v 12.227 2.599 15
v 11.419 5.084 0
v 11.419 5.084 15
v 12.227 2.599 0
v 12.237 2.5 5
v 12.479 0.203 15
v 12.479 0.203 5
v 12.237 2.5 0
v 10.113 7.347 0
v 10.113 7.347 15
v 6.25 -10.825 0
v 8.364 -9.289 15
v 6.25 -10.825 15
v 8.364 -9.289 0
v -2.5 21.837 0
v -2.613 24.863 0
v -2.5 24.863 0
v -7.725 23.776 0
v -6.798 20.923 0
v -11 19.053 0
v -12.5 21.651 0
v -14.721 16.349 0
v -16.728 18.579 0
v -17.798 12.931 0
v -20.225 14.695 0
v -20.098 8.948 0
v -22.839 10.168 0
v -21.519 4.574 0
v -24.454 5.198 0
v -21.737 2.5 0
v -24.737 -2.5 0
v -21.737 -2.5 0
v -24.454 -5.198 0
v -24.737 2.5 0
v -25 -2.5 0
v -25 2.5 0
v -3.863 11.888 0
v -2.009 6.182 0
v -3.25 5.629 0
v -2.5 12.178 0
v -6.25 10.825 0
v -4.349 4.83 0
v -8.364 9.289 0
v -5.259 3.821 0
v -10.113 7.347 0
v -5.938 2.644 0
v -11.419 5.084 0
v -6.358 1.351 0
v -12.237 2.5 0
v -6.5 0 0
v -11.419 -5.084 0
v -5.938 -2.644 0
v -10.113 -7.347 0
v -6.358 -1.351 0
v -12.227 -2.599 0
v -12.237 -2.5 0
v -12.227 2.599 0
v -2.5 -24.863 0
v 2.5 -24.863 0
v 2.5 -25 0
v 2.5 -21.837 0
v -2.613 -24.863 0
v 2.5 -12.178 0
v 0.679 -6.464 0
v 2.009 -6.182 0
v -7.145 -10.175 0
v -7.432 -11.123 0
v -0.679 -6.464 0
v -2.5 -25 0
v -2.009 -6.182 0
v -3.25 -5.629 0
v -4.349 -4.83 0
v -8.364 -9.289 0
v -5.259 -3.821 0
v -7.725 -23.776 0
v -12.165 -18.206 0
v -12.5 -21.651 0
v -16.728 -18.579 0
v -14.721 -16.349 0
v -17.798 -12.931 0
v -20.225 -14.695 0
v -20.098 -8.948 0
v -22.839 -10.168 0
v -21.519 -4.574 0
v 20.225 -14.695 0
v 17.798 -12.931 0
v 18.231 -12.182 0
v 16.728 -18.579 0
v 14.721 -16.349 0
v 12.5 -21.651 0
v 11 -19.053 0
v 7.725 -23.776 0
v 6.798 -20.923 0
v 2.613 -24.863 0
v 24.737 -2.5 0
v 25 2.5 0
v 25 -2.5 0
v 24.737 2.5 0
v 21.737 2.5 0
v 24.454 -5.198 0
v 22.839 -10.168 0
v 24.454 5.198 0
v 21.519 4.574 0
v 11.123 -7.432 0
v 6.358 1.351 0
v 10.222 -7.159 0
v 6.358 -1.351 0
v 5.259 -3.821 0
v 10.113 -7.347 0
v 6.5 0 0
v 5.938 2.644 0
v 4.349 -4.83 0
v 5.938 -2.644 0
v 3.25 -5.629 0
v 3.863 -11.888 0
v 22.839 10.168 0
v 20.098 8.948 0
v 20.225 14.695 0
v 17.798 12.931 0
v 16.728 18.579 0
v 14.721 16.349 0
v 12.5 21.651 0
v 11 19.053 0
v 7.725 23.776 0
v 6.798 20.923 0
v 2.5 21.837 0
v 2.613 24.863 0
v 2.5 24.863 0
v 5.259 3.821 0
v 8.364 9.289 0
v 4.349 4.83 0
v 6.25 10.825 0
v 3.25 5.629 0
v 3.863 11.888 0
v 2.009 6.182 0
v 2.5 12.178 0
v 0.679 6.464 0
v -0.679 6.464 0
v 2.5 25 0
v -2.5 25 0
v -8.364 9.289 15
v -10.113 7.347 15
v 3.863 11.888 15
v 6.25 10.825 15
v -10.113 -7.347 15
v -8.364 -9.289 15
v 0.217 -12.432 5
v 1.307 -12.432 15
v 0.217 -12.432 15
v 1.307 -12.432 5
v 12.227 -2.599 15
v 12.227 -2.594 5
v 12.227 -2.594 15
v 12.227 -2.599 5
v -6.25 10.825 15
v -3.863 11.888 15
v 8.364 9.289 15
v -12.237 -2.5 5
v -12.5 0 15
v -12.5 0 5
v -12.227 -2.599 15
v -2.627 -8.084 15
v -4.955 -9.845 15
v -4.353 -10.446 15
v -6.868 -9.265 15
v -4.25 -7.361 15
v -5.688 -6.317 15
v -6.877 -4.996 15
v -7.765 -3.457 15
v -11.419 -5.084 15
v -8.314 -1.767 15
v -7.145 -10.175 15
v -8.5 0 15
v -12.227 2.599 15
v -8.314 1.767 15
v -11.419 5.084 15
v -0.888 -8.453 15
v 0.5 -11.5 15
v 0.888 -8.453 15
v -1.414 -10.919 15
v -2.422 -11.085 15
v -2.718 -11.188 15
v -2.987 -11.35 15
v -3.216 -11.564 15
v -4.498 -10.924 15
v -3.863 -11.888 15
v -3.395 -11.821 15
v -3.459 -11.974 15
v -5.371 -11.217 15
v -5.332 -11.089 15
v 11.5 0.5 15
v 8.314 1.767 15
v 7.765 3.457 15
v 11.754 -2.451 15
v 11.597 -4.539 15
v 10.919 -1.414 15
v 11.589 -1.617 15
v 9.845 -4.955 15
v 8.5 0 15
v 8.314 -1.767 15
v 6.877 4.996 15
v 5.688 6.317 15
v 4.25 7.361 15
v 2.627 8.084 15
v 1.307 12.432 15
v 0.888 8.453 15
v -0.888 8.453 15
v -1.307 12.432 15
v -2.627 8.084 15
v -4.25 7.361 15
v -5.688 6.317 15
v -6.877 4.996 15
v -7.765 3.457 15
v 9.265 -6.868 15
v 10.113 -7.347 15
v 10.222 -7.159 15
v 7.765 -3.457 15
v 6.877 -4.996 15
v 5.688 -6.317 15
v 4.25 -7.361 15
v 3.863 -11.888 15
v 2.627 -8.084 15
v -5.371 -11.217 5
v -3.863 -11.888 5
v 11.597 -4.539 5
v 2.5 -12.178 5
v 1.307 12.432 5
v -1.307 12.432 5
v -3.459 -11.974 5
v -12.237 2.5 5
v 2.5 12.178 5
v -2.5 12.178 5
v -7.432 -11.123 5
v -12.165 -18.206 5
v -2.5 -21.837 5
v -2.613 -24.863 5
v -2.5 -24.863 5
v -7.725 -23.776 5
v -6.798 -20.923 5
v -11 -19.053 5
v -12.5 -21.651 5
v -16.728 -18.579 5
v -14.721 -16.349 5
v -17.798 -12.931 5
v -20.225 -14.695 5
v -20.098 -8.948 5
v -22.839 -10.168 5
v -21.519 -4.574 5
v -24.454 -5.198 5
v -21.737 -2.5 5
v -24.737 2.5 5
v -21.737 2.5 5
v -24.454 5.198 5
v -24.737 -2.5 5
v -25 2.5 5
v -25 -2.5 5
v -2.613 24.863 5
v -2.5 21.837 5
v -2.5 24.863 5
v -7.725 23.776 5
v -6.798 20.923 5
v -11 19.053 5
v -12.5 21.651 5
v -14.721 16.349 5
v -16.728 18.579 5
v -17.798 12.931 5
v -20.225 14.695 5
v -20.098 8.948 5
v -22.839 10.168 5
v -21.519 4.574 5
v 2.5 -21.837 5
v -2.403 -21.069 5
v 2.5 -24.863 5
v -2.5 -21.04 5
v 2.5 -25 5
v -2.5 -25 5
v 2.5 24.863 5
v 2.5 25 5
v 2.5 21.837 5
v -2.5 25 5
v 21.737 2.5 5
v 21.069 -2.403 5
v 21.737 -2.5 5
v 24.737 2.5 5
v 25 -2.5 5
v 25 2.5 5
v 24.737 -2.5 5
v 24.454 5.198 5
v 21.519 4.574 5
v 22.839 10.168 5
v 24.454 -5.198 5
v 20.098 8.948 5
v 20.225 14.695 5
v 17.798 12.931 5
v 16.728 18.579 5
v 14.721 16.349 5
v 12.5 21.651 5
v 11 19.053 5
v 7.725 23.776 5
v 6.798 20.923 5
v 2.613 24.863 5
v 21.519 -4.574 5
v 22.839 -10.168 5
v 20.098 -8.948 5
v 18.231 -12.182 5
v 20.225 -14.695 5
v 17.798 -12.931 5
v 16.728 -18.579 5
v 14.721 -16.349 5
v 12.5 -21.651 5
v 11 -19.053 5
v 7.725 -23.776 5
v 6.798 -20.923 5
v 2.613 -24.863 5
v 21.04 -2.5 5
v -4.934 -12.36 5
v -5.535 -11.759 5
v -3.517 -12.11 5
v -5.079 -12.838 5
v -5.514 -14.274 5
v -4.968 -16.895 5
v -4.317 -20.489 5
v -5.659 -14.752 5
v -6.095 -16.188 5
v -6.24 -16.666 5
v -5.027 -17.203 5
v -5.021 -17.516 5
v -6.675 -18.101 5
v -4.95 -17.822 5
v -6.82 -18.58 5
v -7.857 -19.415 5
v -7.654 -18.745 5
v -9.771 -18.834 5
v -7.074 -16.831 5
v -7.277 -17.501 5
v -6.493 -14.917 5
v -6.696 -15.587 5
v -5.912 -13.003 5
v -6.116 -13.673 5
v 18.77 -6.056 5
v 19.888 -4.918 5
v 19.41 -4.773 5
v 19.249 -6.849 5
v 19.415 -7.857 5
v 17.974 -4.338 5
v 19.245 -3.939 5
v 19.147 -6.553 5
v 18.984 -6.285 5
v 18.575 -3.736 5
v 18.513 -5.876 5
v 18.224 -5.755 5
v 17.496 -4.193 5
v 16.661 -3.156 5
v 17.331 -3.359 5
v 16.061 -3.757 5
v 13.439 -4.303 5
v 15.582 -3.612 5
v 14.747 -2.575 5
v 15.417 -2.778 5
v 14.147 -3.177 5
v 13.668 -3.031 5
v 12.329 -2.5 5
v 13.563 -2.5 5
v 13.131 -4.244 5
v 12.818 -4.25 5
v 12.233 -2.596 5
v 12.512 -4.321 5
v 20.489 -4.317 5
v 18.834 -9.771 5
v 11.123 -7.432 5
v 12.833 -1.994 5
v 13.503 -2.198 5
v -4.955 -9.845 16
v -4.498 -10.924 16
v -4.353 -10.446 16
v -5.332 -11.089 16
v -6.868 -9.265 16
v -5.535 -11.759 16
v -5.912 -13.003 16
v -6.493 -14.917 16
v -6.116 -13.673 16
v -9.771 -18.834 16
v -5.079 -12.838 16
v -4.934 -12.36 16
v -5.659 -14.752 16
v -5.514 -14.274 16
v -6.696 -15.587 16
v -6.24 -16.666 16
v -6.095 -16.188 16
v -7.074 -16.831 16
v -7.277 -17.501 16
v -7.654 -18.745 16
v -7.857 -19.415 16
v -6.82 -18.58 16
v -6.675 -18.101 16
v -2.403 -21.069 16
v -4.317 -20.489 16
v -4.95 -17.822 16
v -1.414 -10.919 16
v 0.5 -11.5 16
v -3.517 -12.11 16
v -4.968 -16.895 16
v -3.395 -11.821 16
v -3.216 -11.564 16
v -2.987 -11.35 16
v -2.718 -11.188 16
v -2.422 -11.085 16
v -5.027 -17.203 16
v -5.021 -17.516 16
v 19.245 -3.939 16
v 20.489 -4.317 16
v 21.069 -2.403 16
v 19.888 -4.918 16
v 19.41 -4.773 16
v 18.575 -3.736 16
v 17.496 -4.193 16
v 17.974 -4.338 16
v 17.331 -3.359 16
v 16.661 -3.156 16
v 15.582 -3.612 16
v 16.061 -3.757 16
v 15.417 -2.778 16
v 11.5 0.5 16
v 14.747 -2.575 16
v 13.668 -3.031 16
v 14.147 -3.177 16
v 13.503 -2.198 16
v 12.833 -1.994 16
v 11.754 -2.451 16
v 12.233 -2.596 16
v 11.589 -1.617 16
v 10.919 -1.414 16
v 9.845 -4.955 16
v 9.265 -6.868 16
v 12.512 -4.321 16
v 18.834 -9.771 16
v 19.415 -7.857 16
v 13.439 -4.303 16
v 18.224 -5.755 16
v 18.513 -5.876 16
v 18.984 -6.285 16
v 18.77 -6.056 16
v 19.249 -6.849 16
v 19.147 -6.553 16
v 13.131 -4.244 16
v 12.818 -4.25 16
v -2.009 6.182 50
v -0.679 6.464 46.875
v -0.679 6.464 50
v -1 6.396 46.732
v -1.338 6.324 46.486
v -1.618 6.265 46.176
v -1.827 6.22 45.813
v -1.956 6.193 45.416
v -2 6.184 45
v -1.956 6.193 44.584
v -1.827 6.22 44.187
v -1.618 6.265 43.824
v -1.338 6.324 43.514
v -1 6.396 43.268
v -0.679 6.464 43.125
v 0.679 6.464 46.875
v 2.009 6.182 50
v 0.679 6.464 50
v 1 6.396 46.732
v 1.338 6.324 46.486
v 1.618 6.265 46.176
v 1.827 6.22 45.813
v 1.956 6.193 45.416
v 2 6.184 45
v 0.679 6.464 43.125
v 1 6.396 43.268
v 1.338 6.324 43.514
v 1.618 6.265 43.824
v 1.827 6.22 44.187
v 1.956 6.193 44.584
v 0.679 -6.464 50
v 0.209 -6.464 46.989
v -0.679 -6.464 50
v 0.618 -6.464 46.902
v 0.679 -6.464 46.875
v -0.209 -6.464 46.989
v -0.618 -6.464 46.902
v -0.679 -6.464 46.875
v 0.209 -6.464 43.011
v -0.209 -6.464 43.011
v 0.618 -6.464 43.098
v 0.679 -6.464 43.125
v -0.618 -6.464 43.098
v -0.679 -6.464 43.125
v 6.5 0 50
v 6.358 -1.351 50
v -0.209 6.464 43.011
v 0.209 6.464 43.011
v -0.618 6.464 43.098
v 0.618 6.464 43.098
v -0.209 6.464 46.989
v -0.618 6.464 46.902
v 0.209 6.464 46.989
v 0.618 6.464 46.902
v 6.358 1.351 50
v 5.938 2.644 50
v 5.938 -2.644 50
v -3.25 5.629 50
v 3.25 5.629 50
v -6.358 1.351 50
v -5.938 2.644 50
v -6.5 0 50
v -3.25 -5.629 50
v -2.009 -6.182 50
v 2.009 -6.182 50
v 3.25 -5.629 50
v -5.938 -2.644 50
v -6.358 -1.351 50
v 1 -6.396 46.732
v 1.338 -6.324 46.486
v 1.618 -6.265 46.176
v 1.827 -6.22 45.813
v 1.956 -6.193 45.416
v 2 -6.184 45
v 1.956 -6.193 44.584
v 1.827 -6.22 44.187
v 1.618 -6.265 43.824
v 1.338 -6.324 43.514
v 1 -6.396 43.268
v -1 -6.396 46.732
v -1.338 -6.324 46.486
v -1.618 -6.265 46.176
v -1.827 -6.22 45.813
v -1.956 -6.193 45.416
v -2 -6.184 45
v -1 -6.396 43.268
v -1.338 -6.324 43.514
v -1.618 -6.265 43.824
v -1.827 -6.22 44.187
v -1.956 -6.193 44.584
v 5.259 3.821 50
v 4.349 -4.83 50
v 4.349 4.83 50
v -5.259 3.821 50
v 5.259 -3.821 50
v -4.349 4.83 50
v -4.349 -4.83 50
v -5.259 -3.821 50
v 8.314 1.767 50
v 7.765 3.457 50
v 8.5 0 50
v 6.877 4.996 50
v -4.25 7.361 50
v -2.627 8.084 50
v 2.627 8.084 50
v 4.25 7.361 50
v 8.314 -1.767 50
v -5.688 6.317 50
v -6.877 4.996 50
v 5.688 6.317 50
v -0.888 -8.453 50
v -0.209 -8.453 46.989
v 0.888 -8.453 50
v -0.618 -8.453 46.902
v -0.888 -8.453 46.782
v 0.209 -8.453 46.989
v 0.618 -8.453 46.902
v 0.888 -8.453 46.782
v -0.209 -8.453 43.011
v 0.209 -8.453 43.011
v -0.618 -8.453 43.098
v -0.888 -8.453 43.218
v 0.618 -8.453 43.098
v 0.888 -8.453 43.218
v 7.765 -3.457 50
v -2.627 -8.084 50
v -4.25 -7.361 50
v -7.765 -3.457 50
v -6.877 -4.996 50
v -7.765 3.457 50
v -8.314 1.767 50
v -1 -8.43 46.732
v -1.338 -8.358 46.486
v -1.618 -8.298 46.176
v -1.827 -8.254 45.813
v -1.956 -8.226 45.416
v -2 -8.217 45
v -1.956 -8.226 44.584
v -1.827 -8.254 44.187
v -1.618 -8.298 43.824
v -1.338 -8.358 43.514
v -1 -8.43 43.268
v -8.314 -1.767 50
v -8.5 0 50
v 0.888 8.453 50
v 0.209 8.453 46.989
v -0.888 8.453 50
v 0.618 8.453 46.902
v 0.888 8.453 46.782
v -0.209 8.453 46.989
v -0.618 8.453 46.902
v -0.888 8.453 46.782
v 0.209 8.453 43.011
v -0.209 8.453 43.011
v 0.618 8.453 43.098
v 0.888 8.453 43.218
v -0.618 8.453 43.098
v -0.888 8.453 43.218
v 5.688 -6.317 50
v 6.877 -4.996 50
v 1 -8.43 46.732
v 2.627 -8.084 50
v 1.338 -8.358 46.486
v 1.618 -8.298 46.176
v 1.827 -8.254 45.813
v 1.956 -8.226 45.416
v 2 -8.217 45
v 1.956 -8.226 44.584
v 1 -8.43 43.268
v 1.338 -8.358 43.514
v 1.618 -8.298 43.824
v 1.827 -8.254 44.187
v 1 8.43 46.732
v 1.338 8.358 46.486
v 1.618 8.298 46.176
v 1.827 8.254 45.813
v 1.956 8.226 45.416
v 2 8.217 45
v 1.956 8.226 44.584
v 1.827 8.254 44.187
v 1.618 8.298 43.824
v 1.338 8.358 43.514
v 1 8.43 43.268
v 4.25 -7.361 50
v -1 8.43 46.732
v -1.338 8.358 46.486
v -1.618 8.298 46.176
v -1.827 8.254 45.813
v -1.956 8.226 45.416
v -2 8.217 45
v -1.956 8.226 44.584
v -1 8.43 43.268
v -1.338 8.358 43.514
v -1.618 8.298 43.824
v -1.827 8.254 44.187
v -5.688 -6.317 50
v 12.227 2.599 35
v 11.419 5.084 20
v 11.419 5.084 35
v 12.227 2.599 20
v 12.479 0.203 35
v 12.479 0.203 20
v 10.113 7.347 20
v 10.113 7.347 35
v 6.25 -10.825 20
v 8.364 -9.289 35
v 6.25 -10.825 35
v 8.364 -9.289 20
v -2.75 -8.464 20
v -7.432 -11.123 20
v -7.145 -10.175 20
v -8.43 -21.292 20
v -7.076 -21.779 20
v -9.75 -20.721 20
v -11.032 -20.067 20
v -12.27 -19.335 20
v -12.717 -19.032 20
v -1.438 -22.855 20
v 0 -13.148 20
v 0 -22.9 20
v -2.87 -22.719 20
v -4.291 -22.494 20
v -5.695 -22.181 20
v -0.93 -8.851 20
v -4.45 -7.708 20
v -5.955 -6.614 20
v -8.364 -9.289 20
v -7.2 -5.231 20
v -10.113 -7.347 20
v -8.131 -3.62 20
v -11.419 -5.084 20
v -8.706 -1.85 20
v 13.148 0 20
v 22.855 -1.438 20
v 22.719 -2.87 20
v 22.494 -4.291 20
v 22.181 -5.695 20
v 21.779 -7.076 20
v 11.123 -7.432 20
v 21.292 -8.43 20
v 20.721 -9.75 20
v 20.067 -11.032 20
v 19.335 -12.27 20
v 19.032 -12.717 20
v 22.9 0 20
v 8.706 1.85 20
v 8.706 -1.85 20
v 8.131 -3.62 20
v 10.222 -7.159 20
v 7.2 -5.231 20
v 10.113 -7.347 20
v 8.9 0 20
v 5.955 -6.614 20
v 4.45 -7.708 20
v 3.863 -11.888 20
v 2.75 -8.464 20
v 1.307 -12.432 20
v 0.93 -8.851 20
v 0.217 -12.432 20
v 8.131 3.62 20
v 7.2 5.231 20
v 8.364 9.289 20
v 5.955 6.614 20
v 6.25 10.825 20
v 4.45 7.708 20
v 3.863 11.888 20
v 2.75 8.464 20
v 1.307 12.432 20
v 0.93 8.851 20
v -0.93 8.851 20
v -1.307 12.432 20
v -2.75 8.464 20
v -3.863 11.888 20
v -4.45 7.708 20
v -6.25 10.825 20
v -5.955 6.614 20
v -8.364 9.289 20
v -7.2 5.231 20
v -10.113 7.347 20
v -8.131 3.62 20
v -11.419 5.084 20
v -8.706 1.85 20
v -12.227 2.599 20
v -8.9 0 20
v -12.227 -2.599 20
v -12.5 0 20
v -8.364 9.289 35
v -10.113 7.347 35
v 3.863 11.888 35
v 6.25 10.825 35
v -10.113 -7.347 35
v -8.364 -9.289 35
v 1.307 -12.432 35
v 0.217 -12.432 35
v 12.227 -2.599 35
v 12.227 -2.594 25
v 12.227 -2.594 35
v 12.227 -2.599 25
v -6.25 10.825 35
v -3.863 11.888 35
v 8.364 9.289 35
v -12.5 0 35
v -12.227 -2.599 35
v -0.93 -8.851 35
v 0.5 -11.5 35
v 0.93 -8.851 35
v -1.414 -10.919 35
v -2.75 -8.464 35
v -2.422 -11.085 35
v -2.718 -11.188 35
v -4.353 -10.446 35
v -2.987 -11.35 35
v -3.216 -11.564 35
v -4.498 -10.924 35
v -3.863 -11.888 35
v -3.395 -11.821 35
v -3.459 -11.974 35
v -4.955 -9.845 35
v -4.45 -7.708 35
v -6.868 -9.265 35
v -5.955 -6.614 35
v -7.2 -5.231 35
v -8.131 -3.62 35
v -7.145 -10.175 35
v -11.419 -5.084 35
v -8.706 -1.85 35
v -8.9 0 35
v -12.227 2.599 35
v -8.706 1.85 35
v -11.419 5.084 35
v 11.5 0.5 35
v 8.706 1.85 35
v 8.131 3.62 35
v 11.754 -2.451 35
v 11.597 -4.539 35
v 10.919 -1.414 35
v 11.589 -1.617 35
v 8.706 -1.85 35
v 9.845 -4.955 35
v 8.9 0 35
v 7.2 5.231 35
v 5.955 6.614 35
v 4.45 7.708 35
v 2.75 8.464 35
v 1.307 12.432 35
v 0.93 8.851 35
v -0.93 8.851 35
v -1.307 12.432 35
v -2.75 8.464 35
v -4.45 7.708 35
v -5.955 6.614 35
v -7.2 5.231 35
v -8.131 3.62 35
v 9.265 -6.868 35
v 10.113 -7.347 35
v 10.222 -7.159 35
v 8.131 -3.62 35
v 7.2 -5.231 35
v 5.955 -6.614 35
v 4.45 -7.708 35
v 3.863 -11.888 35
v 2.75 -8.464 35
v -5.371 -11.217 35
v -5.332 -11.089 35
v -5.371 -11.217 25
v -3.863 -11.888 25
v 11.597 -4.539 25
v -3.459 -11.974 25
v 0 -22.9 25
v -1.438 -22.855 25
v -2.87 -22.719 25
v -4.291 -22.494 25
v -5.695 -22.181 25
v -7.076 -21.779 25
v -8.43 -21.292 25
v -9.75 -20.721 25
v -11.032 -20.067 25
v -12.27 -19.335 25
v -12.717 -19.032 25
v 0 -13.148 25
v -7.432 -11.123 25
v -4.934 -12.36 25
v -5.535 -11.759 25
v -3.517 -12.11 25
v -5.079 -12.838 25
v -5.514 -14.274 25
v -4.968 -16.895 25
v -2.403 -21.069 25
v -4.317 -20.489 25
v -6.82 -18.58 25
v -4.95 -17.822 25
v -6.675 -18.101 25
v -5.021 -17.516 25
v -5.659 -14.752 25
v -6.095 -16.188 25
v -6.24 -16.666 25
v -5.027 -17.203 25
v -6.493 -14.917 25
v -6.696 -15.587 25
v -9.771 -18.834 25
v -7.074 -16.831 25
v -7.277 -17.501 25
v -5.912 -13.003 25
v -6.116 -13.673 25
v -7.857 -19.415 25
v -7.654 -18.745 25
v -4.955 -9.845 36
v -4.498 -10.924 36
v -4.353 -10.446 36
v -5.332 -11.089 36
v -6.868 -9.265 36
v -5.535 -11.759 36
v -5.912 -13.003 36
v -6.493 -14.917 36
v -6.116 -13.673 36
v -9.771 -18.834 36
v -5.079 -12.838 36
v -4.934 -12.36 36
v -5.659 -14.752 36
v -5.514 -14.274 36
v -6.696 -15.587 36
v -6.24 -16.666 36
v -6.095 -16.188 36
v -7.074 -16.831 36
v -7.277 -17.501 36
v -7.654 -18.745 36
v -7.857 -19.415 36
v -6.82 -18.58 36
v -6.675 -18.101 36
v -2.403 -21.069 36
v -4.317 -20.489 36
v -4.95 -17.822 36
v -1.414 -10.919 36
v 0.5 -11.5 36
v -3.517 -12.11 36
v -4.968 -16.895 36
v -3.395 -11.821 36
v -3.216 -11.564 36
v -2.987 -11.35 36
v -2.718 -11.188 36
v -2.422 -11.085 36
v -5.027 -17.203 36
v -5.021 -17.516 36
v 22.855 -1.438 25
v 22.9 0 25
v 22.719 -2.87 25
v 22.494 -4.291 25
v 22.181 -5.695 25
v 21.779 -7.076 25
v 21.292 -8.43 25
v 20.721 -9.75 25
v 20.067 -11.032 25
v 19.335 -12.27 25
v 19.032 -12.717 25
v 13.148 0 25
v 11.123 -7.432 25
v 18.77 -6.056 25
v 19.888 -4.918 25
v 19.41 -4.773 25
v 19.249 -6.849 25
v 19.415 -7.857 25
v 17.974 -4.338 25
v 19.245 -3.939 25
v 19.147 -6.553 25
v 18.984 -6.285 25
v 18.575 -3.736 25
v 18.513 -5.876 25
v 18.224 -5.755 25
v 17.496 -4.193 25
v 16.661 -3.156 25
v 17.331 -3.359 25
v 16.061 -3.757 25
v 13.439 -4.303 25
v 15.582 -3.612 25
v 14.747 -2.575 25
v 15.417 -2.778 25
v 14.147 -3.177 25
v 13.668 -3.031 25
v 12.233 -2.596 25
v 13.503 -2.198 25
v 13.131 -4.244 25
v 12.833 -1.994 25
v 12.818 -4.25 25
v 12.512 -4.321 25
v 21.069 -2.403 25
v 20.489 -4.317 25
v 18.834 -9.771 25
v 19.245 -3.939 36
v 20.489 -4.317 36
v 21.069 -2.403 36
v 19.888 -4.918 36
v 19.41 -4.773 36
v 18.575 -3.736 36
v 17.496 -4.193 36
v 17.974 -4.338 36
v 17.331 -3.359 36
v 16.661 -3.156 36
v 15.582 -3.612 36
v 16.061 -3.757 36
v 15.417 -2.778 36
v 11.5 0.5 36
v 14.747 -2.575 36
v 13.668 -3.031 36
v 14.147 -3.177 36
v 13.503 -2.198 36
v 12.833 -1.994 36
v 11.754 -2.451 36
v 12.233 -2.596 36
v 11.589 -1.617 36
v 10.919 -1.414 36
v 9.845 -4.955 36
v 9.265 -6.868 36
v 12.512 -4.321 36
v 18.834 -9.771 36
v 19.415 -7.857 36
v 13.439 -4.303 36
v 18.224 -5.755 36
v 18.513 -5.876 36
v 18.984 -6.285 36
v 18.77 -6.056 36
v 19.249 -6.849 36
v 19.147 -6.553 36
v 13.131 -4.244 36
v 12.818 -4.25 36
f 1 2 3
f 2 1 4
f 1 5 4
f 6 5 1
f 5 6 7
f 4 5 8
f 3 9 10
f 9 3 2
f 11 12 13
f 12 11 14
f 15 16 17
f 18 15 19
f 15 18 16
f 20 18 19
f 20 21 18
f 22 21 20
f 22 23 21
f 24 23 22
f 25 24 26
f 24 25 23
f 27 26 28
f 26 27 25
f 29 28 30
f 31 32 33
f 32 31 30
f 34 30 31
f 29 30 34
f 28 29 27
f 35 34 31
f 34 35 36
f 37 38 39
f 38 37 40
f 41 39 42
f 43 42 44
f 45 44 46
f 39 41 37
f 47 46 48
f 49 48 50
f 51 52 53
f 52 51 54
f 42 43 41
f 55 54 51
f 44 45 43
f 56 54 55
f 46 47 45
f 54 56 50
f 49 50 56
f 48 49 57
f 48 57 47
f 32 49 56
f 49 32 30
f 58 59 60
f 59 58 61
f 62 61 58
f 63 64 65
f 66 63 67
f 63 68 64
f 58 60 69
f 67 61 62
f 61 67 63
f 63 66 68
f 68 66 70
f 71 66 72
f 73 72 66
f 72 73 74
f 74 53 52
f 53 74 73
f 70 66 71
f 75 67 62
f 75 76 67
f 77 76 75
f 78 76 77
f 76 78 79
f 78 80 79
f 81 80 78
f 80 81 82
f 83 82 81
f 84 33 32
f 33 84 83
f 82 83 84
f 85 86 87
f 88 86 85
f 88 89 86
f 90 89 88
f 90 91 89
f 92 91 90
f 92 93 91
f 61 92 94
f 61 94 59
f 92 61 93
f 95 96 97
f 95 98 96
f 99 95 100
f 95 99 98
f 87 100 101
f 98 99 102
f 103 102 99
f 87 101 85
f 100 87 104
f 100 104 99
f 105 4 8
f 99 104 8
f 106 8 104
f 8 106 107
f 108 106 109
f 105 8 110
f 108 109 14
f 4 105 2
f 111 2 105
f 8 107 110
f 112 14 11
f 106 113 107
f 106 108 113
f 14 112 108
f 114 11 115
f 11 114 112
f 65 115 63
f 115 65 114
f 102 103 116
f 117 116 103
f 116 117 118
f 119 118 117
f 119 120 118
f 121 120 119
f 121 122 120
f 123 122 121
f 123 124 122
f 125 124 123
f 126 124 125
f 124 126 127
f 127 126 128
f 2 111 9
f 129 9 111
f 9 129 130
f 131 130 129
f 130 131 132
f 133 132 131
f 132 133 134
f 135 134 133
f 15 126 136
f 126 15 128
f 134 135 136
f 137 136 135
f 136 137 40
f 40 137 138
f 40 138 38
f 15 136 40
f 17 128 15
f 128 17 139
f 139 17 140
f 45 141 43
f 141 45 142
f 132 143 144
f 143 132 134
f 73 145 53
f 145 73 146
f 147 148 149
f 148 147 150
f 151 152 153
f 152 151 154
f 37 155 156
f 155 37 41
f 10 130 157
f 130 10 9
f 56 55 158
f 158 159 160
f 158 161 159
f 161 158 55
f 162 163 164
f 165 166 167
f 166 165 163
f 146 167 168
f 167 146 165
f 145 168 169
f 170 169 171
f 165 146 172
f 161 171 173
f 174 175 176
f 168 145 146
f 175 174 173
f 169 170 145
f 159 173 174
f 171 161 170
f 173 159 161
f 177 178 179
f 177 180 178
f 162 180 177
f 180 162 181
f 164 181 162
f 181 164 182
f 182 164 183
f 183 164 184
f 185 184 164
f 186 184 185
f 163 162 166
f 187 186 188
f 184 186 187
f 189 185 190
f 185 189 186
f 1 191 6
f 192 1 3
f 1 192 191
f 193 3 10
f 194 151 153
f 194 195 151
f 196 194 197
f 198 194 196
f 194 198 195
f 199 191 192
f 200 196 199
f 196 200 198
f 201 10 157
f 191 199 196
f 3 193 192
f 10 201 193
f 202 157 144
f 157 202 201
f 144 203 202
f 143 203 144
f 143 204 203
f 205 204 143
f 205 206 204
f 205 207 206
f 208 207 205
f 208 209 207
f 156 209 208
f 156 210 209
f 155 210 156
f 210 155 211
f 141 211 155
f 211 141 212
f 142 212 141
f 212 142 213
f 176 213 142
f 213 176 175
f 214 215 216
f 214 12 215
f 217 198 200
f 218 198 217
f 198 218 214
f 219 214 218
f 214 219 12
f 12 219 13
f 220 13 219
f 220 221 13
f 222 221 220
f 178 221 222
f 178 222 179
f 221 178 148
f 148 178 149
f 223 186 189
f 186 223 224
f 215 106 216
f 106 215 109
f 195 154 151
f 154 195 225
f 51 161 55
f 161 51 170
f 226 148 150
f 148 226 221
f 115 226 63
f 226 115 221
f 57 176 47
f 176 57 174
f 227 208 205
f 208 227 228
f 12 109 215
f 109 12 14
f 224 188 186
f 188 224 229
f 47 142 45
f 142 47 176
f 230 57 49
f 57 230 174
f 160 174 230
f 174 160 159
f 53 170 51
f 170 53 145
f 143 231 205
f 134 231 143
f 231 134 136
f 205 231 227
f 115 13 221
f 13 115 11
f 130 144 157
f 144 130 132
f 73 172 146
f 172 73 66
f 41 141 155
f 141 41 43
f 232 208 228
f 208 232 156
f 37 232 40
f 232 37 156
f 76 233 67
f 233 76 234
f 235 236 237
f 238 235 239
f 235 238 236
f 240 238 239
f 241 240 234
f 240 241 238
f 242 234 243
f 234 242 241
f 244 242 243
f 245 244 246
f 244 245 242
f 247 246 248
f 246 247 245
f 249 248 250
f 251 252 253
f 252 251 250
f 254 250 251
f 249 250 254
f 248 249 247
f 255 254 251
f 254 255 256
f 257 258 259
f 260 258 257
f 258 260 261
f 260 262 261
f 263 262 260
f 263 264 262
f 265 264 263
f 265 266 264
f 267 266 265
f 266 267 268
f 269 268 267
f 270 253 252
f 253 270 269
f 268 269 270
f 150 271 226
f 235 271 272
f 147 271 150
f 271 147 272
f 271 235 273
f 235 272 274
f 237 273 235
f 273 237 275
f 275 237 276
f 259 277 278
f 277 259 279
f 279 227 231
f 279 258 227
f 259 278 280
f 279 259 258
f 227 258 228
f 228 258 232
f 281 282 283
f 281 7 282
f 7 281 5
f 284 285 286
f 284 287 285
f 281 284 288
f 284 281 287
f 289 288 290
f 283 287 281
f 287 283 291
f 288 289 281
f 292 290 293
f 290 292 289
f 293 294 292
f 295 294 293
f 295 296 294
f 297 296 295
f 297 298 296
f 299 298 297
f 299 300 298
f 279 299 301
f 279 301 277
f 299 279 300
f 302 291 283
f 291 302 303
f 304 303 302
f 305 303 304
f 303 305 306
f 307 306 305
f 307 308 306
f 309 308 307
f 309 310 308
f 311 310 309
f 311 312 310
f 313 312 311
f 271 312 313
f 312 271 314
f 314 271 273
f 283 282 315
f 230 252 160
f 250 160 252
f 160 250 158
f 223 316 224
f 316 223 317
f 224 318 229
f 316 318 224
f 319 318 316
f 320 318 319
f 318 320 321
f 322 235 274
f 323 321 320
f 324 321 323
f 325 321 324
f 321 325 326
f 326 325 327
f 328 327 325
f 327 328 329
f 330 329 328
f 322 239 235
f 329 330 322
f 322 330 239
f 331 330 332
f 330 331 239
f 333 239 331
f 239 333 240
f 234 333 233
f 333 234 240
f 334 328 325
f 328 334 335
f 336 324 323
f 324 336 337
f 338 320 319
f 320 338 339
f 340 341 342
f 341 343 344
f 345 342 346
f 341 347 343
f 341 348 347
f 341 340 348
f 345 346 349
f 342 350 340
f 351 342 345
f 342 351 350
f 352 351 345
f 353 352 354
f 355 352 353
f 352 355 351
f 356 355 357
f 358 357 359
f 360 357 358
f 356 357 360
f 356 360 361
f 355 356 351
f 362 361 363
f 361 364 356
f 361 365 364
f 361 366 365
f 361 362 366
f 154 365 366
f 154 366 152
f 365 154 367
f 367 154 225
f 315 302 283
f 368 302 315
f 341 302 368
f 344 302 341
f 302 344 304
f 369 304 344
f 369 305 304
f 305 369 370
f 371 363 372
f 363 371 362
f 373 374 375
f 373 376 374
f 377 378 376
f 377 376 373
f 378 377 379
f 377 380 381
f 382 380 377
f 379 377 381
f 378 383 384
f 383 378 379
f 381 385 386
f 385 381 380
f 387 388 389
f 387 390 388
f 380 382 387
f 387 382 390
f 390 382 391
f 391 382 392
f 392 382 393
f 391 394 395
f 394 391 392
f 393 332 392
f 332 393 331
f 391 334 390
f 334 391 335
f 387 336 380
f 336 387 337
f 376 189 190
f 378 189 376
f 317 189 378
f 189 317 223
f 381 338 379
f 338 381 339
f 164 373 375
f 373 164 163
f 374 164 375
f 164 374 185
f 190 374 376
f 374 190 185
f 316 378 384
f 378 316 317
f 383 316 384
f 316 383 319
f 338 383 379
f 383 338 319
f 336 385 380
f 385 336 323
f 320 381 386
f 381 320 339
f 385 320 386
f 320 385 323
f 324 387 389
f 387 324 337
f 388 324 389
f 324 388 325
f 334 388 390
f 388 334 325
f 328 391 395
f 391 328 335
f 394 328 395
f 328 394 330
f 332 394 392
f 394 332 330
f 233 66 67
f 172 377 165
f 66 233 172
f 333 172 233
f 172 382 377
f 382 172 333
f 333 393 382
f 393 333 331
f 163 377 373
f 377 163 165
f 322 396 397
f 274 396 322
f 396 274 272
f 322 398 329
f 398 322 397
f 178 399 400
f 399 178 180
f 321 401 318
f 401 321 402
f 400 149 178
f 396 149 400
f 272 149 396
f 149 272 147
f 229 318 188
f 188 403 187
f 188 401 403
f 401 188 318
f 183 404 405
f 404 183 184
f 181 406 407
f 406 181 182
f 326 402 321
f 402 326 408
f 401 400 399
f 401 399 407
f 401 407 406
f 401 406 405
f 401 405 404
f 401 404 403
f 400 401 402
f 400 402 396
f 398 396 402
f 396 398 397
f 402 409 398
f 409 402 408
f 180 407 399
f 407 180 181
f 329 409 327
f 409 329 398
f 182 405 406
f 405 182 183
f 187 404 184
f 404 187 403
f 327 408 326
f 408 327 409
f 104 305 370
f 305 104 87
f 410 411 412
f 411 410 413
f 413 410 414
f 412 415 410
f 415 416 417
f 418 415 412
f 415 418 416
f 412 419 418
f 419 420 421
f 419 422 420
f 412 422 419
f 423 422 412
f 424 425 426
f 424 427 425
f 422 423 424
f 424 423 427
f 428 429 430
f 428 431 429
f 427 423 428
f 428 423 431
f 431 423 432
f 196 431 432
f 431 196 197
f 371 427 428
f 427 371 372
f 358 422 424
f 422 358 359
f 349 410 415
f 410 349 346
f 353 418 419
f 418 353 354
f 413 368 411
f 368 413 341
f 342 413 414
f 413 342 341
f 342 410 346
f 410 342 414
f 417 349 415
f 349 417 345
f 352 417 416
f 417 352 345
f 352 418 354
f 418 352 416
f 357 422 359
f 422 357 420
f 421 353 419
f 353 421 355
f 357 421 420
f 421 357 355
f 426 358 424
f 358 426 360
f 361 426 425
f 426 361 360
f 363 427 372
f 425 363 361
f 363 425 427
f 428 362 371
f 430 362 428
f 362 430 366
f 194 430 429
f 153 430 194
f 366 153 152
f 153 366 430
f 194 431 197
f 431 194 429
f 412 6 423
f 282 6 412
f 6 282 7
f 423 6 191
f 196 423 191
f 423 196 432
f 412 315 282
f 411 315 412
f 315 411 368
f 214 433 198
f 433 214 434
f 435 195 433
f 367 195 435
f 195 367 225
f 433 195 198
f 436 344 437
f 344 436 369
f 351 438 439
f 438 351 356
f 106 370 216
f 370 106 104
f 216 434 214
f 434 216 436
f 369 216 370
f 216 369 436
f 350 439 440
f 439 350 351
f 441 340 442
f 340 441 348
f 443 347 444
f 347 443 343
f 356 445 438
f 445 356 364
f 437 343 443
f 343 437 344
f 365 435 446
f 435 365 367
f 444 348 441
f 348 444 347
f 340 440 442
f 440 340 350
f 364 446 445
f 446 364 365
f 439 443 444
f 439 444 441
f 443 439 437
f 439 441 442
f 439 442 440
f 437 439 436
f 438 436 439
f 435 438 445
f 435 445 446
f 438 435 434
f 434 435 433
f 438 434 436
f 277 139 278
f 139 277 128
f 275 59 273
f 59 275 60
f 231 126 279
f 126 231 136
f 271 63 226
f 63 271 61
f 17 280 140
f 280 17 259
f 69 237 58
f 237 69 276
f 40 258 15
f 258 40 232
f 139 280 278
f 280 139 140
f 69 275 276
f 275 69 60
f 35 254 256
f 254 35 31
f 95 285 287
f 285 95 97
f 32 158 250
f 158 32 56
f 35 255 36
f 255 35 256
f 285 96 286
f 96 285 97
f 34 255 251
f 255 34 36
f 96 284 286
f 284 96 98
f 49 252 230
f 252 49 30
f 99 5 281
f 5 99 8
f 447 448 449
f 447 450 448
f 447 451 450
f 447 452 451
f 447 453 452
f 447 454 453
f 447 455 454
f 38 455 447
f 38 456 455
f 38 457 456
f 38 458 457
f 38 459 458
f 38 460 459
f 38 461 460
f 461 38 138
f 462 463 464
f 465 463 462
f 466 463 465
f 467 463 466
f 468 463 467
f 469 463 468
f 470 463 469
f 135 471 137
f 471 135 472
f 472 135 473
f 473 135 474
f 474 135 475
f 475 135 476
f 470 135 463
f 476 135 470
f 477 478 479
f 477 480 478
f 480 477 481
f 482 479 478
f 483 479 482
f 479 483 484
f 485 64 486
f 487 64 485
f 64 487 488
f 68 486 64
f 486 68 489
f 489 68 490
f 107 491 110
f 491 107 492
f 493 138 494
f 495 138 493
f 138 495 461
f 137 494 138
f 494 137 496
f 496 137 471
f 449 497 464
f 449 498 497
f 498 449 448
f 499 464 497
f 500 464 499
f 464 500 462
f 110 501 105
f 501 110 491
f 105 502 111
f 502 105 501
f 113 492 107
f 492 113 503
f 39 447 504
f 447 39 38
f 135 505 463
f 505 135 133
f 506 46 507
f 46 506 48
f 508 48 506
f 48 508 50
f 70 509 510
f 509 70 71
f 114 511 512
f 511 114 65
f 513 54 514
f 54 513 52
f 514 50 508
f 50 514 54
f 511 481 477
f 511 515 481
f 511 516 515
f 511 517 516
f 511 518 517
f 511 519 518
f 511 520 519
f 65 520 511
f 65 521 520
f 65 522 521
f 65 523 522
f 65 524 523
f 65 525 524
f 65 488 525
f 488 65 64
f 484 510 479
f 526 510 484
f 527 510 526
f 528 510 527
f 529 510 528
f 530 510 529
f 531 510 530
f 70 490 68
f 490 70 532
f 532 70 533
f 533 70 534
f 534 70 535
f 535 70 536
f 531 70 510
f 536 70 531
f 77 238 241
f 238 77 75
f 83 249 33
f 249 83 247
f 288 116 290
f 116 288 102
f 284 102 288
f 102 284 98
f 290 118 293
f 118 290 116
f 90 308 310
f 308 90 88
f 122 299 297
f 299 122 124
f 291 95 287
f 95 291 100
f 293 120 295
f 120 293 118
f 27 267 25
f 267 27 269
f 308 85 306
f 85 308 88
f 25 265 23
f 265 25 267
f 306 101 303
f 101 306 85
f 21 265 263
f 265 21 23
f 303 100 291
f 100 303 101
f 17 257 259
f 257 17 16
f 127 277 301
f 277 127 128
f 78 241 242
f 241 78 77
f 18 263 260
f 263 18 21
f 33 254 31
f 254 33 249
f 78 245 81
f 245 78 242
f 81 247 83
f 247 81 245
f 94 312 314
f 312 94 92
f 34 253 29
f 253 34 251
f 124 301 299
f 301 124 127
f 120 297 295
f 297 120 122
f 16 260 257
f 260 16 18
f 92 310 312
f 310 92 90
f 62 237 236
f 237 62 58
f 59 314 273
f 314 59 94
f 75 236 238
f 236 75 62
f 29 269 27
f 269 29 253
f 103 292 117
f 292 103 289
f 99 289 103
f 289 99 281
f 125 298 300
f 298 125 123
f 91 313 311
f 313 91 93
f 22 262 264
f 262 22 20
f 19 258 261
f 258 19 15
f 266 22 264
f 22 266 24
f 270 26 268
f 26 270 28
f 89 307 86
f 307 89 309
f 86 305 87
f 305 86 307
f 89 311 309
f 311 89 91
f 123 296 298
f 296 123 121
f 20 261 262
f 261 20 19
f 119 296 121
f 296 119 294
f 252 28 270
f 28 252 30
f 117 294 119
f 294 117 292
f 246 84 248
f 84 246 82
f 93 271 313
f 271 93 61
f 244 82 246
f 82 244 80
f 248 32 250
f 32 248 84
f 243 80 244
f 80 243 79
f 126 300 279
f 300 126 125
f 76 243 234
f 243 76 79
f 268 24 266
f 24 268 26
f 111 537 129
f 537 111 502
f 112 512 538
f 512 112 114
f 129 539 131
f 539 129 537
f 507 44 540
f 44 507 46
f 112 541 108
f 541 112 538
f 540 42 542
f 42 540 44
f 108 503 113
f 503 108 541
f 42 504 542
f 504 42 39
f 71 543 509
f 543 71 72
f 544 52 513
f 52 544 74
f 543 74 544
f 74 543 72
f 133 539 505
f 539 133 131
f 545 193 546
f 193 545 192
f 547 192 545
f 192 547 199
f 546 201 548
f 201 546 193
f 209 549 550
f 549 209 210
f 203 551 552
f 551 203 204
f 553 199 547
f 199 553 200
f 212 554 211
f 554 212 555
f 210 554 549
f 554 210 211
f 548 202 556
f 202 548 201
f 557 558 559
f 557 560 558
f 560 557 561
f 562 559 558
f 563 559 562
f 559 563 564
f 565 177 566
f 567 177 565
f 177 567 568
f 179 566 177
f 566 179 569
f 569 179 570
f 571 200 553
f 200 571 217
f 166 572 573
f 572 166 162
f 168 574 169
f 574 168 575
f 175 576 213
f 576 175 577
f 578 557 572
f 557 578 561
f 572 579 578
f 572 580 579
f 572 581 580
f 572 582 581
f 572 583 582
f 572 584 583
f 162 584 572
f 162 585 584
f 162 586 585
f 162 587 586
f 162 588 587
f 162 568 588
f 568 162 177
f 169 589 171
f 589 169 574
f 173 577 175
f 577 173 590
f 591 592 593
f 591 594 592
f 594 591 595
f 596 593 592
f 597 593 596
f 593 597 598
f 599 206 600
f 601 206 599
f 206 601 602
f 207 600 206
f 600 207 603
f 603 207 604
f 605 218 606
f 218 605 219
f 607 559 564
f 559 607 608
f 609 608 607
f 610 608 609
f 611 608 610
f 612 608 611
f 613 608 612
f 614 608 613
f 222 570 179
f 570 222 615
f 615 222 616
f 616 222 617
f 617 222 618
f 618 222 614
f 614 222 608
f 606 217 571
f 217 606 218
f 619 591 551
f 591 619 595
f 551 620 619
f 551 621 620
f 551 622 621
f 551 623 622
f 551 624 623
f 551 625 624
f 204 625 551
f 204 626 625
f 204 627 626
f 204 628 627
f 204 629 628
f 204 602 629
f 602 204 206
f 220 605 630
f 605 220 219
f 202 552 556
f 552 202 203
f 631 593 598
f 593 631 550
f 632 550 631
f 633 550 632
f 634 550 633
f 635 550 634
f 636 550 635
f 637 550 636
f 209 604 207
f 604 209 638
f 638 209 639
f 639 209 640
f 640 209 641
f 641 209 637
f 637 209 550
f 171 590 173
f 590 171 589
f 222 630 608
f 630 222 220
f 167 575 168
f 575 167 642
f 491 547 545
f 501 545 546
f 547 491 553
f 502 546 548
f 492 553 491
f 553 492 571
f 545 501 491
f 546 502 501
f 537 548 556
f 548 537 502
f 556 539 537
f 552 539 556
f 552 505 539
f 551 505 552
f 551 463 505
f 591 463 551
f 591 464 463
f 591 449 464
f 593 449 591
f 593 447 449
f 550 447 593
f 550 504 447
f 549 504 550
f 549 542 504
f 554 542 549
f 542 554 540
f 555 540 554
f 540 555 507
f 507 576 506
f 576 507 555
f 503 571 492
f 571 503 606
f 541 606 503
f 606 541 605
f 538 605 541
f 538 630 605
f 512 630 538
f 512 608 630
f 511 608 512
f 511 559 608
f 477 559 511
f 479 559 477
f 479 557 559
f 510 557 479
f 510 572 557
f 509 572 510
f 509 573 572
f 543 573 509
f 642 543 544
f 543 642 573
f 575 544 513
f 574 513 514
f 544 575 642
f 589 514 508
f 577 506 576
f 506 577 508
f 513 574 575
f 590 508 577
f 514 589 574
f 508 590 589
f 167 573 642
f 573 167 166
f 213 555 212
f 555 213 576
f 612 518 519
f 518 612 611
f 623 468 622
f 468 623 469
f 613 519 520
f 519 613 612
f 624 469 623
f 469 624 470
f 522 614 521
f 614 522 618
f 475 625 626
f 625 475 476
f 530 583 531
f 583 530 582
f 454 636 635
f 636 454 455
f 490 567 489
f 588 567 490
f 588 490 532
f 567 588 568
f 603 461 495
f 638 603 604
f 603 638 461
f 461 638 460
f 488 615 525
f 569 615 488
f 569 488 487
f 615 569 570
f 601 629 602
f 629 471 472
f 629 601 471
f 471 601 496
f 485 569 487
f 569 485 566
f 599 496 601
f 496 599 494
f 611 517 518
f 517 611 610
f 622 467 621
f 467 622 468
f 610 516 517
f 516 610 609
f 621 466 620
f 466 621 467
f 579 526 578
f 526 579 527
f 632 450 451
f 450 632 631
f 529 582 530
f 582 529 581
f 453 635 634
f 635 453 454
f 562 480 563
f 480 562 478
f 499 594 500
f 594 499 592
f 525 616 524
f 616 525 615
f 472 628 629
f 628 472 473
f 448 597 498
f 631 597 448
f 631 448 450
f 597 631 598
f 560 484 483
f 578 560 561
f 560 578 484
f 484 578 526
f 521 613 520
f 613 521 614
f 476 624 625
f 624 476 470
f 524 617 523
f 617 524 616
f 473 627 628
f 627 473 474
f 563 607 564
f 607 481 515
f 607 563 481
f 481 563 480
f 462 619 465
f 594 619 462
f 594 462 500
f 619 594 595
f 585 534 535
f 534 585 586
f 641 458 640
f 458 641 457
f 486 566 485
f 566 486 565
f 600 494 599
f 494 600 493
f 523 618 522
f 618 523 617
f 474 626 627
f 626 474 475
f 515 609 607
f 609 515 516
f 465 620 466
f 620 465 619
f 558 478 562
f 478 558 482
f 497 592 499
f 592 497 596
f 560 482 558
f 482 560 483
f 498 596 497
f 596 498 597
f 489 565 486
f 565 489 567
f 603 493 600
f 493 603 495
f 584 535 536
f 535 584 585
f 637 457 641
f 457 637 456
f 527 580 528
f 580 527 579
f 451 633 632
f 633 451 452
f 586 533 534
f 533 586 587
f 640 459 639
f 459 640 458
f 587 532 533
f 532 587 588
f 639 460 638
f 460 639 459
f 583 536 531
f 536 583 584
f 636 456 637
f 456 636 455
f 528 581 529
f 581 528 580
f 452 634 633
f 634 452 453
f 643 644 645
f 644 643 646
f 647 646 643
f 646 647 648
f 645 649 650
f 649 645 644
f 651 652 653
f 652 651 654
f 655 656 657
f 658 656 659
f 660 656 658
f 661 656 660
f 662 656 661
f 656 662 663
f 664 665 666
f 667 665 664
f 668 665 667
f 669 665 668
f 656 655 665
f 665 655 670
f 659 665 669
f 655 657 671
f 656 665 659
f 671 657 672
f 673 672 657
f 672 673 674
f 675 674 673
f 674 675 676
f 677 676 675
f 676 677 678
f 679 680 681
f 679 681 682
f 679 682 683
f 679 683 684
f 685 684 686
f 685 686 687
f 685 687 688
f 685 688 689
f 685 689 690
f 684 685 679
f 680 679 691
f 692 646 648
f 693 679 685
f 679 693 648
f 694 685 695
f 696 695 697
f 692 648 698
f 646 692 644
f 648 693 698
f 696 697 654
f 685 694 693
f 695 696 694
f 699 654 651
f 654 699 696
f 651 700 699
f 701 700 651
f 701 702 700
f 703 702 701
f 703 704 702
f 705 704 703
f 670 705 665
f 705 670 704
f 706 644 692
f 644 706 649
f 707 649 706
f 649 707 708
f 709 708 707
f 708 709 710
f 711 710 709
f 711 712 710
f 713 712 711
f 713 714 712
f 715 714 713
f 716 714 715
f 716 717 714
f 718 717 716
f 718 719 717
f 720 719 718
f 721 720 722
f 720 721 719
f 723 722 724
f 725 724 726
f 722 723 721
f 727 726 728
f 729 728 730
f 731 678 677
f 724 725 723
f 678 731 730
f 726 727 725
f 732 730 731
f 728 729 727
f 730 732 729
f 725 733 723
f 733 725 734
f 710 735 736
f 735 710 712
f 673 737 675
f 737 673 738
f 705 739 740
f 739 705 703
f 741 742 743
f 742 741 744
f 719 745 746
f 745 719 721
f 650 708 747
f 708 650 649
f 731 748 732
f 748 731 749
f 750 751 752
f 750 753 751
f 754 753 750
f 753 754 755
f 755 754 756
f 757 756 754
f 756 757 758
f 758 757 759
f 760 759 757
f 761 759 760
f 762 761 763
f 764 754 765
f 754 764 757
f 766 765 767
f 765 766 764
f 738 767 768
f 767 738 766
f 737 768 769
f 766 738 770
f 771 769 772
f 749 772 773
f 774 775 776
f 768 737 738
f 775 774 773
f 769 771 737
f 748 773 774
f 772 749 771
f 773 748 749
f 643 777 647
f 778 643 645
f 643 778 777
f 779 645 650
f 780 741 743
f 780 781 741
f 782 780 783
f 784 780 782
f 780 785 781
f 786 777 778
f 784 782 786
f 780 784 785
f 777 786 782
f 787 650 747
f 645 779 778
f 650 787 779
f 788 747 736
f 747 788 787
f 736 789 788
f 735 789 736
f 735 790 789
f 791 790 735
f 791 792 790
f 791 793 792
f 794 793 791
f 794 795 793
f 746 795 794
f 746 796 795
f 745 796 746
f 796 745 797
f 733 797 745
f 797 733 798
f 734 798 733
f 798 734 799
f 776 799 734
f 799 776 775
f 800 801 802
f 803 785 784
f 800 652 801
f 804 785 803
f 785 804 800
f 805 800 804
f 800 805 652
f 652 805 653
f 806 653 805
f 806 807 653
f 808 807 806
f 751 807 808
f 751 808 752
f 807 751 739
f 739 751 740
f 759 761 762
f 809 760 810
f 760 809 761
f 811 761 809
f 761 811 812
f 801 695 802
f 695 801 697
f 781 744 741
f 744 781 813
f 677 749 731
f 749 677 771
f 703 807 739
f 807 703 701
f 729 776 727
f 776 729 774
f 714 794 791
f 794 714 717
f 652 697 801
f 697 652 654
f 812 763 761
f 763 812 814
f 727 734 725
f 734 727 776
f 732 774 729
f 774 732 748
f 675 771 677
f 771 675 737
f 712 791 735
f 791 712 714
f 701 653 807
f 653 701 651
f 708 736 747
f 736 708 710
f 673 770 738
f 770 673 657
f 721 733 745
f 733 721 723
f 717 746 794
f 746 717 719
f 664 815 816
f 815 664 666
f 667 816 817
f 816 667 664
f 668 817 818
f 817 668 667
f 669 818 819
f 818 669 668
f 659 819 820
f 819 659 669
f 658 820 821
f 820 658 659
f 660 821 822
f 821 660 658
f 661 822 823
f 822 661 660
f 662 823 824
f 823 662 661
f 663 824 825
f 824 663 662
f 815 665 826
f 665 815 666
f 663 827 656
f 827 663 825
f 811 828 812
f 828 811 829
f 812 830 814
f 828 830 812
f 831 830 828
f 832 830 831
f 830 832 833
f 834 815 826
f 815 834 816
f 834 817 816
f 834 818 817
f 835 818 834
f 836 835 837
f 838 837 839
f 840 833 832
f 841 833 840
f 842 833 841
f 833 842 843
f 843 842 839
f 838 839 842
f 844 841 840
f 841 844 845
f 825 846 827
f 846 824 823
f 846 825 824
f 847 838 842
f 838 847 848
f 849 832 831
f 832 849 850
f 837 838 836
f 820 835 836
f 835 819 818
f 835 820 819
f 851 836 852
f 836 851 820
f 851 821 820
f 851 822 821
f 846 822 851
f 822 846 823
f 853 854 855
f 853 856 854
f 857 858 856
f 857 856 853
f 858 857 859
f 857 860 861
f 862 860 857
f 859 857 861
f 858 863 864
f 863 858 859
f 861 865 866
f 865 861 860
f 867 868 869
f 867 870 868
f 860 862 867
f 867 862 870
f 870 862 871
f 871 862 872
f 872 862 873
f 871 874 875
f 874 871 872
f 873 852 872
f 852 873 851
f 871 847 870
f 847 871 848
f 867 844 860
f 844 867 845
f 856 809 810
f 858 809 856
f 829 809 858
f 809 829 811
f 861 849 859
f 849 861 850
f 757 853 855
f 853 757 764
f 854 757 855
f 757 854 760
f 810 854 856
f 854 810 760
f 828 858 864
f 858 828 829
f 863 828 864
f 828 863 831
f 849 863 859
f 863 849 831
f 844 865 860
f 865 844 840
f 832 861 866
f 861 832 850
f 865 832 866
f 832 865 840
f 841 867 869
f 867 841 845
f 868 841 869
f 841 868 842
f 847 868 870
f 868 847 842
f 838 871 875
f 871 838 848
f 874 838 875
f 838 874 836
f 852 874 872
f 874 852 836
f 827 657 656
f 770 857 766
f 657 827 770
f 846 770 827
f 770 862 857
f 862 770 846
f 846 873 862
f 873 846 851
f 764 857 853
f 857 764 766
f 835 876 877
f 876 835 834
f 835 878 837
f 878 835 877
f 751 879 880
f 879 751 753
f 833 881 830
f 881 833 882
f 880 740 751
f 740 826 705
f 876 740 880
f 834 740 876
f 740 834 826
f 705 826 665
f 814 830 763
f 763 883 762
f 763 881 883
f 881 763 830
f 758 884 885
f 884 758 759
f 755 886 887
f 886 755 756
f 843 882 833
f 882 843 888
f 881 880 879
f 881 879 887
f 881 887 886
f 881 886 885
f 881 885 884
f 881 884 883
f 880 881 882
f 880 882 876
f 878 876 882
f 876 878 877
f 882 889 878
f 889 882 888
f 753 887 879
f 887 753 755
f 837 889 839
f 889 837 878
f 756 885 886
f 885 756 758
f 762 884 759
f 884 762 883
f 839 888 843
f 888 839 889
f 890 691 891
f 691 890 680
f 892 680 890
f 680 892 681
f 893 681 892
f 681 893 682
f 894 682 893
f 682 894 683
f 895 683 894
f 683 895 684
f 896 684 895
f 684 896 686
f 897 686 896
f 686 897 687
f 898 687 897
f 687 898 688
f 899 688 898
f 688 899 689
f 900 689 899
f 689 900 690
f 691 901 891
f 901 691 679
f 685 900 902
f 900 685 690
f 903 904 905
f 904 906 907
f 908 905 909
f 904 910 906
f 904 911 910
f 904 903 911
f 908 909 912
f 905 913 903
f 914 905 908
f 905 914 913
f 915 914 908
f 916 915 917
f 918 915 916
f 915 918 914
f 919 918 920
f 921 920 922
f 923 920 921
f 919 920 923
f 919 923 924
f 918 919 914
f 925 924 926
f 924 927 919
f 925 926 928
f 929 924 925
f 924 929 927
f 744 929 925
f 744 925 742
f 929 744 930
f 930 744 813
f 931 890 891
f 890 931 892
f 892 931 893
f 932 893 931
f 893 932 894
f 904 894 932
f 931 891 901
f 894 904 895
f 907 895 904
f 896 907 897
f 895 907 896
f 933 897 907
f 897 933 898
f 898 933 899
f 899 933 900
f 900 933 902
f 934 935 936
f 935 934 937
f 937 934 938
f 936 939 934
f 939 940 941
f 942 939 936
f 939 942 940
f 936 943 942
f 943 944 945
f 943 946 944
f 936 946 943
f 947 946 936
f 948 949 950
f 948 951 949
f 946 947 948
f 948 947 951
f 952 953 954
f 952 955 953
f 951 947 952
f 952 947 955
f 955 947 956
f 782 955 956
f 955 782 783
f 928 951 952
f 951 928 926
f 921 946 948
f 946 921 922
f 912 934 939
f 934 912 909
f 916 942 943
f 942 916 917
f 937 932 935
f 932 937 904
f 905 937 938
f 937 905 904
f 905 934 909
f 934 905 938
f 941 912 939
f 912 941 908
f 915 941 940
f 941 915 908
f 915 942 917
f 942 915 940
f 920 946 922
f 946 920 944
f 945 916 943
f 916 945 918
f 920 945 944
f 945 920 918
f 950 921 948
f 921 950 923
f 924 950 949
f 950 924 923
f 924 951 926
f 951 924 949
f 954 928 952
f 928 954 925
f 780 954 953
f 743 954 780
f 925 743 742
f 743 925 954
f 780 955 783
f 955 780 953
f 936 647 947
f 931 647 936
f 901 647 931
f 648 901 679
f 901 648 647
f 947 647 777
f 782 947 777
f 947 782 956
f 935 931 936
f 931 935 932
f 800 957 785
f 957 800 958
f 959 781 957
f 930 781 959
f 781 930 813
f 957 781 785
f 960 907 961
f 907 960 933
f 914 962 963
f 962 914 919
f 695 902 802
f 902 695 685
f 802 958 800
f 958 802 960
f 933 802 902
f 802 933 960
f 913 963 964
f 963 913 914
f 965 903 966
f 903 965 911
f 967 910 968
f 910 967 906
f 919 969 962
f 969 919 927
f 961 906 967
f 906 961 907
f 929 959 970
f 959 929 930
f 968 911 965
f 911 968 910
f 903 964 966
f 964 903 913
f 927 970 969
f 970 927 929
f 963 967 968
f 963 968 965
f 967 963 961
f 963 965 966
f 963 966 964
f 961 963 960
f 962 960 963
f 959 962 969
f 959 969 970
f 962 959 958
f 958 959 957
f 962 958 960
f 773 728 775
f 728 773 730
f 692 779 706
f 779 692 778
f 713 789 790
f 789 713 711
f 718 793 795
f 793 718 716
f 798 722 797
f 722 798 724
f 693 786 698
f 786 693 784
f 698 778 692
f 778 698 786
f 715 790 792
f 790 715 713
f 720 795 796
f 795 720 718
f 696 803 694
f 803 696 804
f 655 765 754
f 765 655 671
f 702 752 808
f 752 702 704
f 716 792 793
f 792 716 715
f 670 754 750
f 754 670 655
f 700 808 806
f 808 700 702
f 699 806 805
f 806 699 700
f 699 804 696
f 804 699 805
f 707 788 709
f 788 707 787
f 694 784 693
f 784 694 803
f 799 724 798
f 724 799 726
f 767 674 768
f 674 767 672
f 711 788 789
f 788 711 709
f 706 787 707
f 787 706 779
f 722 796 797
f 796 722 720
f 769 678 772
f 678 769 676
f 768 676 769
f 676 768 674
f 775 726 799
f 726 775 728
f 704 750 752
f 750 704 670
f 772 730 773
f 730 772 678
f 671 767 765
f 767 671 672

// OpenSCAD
// file: gondola_arm.scad
include <gondola_base.scad>

holder_radio_shrink = 2;
arm_height = 10;
arm_belt_radius = 10;
$fn = 30;
trap_distance = 1.2; 
belt_height = 6;
arm_delta = 0.4;

/* 
 * Excerpt from... 
 * Parametric Encoder Wheel 
 * by Alex Franke (codecreations), March 2012
 * http://www.theFrankes.com
 * Licenced under Creative Commons Attribution - Non-Commercial - Share Alike 3.0 
*/
 
module arc( height, depth, radius, degrees ) {
    // This dies a horible death if it's not rendered here 
    // -- sucks up all memory and spins out of control 
    render() {
        difference() {
            // Outer ring
            rotate_extrude($fn = 100)
                translate([radius - height, 0, 0])
                    square([height,depth]);
         
            // Cut half off
            translate([0,-(radius+1),-.5]) 
                cube ([radius+1,(radius+1)*2,depth+1]);
         
            // Cover the other half as necessary
            rotate([0,0,180-degrees])
            translate([0,-(radius+1),-.5]) 
                cube ([radius+1,(radius+1)*2,depth+1]);
         
        }
    }
}

// Nicked from https://cdn.thingiverse.com/zipfiles/da/60/31/e2/71/RepRap_Pro_Ormerod_iamburnys_Y-axis_Belt_Clamp_-_Parametric.zip
module teeth(){
	module tooth() {
		x = 1.3;
		y = arm_height + belt_height;
		z= 0.75;
		a = 0.4;
	
		polyhedron(
			points=[[0,0,0] , [a,0,z] , [x-a,0,z] , [x,0,0] ,[0,y,0] , [a,y,z] , [x-a,y,z] , [x,y,0]],
			triangles=[[3,4,0],[3,7,4],  [1,5,2],[2,5,6],  [0,1,2],[0,2,3], [0,4,5], [0,5,1],  [7,6,5], [7,5,4],  [3,2,6], [3,6,7]
			]);
	}

	translate ([0,-10,0])
	        cube([arm_height + belt_height,10,2]);
	
	for (i = [0:4]) {
		translate([arm_height + belt_height,-10+(i*2),2])
			rotate([0,0,90])
				tooth();
    
	}
}

module ArmBase(){
	difference(){
	    arc(20, arm_height, holder_base_radio + arm_belt_radius + arm_delta, 33.75);   
	    translate([0, 0, arm_height/2]) arc(20, arm_height/2, holder_base_radio + arm_belt_radius+ arm_delta, 33.75);   
	}
}


module Trap(){
		translate([-3.5 - 2 - trap_distance, -5, (arm_height + belt_height)/2])
			resize([0, 0, arm_height + belt_height])
				rotate([180,-90, 0])
					hull(){
						cube([7, 10, 2], true);
						translate([0, -3.5/2, 3.5/3])rotate([0,90,0]) cylinder(7, 1.5, 1.5, true);
						translate([0, 5 - 3.5/2, 3.5/3])rotate([0,90,0]) cylinder(7, 1.5, 1.5, true);
					}
}


module RightArmTrap(){
	translate([0.5, -holder_base_radio + arm_belt_radius - 4 - arm_height/2, 0])
		rotate([0,0,-33.75/2]){
			translate([-(trap_distance + 6.5), -10,0])	
				rotate([0,0,180])
			union(){
				rotate([0,-90,0])
					teeth();
		
				Trap();
			}
		}
}


module ArmTrap(){
	translate([0.5, -holder_base_radio + arm_belt_radius - 4 - arm_height/2, 0])
		rotate([0,0,-33.75/2]){
			rotate([0,-90,0])
				teeth();

			Trap();
		}
}


module Arm(){
	difference(){
	    union(){
	        HolderBase(delta=arm_delta);
	        ArmBase();
	        RightArmTrap();
	
	        rotate(90){
	            ArmBase();
	            ArmTrap();
	        }
	    }
	    cylinder(r = holder_radio + arm_delta, h = holder_base_height);
	}
}

/*HolderBase();
//Base();
//	translate([0,0,20])
		color([1,0,1])
		Arm();
*/

Arm();
// file: gondola_base.scad
$fn = 40;
// ------------ Base
base_radio = 50/2;
base_height = 5;
base_wall = 3;
// ------------ Holder
holder_base_radio = 25/2;
holder_base_height = base_height + 10;
holder_radio = 17/2;
holder_wall = 2;
holder_height = 50;
// ------------ Screw
screw_diameter = 4;


module HolderBase(delta = 0){
	difference(){
	    cylinder(r = holder_base_radio , h = holder_base_height);
	    cylinder(r = holder_radio - holder_wall + delta, h = holder_base_height);
	}
}

module Base(){
	module BaseBase(){
		size = [5, base_radio*2, base_height];
		difference(){
		    union(){
		        translate([0, 0, base_height/2])
		            cube(size, true);
		        rotate(90)
		            translate([0, 0, base_height/2])
		                cube(size, true);
		        }
		    cylinder(r = holder_radio - holder_wall, h = base_height);
		}
	
		difference(){
			cylinder(r = base_radio, h = base_height);
			cylinder(r = base_radio - base_wall, h = base_height);
		}
	}
	
	
	module Holder(){
		difference(){
			cylinder(r = holder_radio, h = holder_height);
			cylinder(r = holder_radio - holder_wall, h = holder_height);

translate([0, holder_radio, 0.9*holder_height])
			rotate([90,0,0])
			cylinder(r = screw_diameter/2, h = holder_radio*2);
	}
		}

BaseBase();
HolderBase();
Holder();
}
//Base();
// main file
include <gondola_base.scad>
include <gondola_arm.scad>

color([0,0,1])
	Base();
color([0,1,0])
translate([0, 0, base_height + holder_base_height])
Arm();
